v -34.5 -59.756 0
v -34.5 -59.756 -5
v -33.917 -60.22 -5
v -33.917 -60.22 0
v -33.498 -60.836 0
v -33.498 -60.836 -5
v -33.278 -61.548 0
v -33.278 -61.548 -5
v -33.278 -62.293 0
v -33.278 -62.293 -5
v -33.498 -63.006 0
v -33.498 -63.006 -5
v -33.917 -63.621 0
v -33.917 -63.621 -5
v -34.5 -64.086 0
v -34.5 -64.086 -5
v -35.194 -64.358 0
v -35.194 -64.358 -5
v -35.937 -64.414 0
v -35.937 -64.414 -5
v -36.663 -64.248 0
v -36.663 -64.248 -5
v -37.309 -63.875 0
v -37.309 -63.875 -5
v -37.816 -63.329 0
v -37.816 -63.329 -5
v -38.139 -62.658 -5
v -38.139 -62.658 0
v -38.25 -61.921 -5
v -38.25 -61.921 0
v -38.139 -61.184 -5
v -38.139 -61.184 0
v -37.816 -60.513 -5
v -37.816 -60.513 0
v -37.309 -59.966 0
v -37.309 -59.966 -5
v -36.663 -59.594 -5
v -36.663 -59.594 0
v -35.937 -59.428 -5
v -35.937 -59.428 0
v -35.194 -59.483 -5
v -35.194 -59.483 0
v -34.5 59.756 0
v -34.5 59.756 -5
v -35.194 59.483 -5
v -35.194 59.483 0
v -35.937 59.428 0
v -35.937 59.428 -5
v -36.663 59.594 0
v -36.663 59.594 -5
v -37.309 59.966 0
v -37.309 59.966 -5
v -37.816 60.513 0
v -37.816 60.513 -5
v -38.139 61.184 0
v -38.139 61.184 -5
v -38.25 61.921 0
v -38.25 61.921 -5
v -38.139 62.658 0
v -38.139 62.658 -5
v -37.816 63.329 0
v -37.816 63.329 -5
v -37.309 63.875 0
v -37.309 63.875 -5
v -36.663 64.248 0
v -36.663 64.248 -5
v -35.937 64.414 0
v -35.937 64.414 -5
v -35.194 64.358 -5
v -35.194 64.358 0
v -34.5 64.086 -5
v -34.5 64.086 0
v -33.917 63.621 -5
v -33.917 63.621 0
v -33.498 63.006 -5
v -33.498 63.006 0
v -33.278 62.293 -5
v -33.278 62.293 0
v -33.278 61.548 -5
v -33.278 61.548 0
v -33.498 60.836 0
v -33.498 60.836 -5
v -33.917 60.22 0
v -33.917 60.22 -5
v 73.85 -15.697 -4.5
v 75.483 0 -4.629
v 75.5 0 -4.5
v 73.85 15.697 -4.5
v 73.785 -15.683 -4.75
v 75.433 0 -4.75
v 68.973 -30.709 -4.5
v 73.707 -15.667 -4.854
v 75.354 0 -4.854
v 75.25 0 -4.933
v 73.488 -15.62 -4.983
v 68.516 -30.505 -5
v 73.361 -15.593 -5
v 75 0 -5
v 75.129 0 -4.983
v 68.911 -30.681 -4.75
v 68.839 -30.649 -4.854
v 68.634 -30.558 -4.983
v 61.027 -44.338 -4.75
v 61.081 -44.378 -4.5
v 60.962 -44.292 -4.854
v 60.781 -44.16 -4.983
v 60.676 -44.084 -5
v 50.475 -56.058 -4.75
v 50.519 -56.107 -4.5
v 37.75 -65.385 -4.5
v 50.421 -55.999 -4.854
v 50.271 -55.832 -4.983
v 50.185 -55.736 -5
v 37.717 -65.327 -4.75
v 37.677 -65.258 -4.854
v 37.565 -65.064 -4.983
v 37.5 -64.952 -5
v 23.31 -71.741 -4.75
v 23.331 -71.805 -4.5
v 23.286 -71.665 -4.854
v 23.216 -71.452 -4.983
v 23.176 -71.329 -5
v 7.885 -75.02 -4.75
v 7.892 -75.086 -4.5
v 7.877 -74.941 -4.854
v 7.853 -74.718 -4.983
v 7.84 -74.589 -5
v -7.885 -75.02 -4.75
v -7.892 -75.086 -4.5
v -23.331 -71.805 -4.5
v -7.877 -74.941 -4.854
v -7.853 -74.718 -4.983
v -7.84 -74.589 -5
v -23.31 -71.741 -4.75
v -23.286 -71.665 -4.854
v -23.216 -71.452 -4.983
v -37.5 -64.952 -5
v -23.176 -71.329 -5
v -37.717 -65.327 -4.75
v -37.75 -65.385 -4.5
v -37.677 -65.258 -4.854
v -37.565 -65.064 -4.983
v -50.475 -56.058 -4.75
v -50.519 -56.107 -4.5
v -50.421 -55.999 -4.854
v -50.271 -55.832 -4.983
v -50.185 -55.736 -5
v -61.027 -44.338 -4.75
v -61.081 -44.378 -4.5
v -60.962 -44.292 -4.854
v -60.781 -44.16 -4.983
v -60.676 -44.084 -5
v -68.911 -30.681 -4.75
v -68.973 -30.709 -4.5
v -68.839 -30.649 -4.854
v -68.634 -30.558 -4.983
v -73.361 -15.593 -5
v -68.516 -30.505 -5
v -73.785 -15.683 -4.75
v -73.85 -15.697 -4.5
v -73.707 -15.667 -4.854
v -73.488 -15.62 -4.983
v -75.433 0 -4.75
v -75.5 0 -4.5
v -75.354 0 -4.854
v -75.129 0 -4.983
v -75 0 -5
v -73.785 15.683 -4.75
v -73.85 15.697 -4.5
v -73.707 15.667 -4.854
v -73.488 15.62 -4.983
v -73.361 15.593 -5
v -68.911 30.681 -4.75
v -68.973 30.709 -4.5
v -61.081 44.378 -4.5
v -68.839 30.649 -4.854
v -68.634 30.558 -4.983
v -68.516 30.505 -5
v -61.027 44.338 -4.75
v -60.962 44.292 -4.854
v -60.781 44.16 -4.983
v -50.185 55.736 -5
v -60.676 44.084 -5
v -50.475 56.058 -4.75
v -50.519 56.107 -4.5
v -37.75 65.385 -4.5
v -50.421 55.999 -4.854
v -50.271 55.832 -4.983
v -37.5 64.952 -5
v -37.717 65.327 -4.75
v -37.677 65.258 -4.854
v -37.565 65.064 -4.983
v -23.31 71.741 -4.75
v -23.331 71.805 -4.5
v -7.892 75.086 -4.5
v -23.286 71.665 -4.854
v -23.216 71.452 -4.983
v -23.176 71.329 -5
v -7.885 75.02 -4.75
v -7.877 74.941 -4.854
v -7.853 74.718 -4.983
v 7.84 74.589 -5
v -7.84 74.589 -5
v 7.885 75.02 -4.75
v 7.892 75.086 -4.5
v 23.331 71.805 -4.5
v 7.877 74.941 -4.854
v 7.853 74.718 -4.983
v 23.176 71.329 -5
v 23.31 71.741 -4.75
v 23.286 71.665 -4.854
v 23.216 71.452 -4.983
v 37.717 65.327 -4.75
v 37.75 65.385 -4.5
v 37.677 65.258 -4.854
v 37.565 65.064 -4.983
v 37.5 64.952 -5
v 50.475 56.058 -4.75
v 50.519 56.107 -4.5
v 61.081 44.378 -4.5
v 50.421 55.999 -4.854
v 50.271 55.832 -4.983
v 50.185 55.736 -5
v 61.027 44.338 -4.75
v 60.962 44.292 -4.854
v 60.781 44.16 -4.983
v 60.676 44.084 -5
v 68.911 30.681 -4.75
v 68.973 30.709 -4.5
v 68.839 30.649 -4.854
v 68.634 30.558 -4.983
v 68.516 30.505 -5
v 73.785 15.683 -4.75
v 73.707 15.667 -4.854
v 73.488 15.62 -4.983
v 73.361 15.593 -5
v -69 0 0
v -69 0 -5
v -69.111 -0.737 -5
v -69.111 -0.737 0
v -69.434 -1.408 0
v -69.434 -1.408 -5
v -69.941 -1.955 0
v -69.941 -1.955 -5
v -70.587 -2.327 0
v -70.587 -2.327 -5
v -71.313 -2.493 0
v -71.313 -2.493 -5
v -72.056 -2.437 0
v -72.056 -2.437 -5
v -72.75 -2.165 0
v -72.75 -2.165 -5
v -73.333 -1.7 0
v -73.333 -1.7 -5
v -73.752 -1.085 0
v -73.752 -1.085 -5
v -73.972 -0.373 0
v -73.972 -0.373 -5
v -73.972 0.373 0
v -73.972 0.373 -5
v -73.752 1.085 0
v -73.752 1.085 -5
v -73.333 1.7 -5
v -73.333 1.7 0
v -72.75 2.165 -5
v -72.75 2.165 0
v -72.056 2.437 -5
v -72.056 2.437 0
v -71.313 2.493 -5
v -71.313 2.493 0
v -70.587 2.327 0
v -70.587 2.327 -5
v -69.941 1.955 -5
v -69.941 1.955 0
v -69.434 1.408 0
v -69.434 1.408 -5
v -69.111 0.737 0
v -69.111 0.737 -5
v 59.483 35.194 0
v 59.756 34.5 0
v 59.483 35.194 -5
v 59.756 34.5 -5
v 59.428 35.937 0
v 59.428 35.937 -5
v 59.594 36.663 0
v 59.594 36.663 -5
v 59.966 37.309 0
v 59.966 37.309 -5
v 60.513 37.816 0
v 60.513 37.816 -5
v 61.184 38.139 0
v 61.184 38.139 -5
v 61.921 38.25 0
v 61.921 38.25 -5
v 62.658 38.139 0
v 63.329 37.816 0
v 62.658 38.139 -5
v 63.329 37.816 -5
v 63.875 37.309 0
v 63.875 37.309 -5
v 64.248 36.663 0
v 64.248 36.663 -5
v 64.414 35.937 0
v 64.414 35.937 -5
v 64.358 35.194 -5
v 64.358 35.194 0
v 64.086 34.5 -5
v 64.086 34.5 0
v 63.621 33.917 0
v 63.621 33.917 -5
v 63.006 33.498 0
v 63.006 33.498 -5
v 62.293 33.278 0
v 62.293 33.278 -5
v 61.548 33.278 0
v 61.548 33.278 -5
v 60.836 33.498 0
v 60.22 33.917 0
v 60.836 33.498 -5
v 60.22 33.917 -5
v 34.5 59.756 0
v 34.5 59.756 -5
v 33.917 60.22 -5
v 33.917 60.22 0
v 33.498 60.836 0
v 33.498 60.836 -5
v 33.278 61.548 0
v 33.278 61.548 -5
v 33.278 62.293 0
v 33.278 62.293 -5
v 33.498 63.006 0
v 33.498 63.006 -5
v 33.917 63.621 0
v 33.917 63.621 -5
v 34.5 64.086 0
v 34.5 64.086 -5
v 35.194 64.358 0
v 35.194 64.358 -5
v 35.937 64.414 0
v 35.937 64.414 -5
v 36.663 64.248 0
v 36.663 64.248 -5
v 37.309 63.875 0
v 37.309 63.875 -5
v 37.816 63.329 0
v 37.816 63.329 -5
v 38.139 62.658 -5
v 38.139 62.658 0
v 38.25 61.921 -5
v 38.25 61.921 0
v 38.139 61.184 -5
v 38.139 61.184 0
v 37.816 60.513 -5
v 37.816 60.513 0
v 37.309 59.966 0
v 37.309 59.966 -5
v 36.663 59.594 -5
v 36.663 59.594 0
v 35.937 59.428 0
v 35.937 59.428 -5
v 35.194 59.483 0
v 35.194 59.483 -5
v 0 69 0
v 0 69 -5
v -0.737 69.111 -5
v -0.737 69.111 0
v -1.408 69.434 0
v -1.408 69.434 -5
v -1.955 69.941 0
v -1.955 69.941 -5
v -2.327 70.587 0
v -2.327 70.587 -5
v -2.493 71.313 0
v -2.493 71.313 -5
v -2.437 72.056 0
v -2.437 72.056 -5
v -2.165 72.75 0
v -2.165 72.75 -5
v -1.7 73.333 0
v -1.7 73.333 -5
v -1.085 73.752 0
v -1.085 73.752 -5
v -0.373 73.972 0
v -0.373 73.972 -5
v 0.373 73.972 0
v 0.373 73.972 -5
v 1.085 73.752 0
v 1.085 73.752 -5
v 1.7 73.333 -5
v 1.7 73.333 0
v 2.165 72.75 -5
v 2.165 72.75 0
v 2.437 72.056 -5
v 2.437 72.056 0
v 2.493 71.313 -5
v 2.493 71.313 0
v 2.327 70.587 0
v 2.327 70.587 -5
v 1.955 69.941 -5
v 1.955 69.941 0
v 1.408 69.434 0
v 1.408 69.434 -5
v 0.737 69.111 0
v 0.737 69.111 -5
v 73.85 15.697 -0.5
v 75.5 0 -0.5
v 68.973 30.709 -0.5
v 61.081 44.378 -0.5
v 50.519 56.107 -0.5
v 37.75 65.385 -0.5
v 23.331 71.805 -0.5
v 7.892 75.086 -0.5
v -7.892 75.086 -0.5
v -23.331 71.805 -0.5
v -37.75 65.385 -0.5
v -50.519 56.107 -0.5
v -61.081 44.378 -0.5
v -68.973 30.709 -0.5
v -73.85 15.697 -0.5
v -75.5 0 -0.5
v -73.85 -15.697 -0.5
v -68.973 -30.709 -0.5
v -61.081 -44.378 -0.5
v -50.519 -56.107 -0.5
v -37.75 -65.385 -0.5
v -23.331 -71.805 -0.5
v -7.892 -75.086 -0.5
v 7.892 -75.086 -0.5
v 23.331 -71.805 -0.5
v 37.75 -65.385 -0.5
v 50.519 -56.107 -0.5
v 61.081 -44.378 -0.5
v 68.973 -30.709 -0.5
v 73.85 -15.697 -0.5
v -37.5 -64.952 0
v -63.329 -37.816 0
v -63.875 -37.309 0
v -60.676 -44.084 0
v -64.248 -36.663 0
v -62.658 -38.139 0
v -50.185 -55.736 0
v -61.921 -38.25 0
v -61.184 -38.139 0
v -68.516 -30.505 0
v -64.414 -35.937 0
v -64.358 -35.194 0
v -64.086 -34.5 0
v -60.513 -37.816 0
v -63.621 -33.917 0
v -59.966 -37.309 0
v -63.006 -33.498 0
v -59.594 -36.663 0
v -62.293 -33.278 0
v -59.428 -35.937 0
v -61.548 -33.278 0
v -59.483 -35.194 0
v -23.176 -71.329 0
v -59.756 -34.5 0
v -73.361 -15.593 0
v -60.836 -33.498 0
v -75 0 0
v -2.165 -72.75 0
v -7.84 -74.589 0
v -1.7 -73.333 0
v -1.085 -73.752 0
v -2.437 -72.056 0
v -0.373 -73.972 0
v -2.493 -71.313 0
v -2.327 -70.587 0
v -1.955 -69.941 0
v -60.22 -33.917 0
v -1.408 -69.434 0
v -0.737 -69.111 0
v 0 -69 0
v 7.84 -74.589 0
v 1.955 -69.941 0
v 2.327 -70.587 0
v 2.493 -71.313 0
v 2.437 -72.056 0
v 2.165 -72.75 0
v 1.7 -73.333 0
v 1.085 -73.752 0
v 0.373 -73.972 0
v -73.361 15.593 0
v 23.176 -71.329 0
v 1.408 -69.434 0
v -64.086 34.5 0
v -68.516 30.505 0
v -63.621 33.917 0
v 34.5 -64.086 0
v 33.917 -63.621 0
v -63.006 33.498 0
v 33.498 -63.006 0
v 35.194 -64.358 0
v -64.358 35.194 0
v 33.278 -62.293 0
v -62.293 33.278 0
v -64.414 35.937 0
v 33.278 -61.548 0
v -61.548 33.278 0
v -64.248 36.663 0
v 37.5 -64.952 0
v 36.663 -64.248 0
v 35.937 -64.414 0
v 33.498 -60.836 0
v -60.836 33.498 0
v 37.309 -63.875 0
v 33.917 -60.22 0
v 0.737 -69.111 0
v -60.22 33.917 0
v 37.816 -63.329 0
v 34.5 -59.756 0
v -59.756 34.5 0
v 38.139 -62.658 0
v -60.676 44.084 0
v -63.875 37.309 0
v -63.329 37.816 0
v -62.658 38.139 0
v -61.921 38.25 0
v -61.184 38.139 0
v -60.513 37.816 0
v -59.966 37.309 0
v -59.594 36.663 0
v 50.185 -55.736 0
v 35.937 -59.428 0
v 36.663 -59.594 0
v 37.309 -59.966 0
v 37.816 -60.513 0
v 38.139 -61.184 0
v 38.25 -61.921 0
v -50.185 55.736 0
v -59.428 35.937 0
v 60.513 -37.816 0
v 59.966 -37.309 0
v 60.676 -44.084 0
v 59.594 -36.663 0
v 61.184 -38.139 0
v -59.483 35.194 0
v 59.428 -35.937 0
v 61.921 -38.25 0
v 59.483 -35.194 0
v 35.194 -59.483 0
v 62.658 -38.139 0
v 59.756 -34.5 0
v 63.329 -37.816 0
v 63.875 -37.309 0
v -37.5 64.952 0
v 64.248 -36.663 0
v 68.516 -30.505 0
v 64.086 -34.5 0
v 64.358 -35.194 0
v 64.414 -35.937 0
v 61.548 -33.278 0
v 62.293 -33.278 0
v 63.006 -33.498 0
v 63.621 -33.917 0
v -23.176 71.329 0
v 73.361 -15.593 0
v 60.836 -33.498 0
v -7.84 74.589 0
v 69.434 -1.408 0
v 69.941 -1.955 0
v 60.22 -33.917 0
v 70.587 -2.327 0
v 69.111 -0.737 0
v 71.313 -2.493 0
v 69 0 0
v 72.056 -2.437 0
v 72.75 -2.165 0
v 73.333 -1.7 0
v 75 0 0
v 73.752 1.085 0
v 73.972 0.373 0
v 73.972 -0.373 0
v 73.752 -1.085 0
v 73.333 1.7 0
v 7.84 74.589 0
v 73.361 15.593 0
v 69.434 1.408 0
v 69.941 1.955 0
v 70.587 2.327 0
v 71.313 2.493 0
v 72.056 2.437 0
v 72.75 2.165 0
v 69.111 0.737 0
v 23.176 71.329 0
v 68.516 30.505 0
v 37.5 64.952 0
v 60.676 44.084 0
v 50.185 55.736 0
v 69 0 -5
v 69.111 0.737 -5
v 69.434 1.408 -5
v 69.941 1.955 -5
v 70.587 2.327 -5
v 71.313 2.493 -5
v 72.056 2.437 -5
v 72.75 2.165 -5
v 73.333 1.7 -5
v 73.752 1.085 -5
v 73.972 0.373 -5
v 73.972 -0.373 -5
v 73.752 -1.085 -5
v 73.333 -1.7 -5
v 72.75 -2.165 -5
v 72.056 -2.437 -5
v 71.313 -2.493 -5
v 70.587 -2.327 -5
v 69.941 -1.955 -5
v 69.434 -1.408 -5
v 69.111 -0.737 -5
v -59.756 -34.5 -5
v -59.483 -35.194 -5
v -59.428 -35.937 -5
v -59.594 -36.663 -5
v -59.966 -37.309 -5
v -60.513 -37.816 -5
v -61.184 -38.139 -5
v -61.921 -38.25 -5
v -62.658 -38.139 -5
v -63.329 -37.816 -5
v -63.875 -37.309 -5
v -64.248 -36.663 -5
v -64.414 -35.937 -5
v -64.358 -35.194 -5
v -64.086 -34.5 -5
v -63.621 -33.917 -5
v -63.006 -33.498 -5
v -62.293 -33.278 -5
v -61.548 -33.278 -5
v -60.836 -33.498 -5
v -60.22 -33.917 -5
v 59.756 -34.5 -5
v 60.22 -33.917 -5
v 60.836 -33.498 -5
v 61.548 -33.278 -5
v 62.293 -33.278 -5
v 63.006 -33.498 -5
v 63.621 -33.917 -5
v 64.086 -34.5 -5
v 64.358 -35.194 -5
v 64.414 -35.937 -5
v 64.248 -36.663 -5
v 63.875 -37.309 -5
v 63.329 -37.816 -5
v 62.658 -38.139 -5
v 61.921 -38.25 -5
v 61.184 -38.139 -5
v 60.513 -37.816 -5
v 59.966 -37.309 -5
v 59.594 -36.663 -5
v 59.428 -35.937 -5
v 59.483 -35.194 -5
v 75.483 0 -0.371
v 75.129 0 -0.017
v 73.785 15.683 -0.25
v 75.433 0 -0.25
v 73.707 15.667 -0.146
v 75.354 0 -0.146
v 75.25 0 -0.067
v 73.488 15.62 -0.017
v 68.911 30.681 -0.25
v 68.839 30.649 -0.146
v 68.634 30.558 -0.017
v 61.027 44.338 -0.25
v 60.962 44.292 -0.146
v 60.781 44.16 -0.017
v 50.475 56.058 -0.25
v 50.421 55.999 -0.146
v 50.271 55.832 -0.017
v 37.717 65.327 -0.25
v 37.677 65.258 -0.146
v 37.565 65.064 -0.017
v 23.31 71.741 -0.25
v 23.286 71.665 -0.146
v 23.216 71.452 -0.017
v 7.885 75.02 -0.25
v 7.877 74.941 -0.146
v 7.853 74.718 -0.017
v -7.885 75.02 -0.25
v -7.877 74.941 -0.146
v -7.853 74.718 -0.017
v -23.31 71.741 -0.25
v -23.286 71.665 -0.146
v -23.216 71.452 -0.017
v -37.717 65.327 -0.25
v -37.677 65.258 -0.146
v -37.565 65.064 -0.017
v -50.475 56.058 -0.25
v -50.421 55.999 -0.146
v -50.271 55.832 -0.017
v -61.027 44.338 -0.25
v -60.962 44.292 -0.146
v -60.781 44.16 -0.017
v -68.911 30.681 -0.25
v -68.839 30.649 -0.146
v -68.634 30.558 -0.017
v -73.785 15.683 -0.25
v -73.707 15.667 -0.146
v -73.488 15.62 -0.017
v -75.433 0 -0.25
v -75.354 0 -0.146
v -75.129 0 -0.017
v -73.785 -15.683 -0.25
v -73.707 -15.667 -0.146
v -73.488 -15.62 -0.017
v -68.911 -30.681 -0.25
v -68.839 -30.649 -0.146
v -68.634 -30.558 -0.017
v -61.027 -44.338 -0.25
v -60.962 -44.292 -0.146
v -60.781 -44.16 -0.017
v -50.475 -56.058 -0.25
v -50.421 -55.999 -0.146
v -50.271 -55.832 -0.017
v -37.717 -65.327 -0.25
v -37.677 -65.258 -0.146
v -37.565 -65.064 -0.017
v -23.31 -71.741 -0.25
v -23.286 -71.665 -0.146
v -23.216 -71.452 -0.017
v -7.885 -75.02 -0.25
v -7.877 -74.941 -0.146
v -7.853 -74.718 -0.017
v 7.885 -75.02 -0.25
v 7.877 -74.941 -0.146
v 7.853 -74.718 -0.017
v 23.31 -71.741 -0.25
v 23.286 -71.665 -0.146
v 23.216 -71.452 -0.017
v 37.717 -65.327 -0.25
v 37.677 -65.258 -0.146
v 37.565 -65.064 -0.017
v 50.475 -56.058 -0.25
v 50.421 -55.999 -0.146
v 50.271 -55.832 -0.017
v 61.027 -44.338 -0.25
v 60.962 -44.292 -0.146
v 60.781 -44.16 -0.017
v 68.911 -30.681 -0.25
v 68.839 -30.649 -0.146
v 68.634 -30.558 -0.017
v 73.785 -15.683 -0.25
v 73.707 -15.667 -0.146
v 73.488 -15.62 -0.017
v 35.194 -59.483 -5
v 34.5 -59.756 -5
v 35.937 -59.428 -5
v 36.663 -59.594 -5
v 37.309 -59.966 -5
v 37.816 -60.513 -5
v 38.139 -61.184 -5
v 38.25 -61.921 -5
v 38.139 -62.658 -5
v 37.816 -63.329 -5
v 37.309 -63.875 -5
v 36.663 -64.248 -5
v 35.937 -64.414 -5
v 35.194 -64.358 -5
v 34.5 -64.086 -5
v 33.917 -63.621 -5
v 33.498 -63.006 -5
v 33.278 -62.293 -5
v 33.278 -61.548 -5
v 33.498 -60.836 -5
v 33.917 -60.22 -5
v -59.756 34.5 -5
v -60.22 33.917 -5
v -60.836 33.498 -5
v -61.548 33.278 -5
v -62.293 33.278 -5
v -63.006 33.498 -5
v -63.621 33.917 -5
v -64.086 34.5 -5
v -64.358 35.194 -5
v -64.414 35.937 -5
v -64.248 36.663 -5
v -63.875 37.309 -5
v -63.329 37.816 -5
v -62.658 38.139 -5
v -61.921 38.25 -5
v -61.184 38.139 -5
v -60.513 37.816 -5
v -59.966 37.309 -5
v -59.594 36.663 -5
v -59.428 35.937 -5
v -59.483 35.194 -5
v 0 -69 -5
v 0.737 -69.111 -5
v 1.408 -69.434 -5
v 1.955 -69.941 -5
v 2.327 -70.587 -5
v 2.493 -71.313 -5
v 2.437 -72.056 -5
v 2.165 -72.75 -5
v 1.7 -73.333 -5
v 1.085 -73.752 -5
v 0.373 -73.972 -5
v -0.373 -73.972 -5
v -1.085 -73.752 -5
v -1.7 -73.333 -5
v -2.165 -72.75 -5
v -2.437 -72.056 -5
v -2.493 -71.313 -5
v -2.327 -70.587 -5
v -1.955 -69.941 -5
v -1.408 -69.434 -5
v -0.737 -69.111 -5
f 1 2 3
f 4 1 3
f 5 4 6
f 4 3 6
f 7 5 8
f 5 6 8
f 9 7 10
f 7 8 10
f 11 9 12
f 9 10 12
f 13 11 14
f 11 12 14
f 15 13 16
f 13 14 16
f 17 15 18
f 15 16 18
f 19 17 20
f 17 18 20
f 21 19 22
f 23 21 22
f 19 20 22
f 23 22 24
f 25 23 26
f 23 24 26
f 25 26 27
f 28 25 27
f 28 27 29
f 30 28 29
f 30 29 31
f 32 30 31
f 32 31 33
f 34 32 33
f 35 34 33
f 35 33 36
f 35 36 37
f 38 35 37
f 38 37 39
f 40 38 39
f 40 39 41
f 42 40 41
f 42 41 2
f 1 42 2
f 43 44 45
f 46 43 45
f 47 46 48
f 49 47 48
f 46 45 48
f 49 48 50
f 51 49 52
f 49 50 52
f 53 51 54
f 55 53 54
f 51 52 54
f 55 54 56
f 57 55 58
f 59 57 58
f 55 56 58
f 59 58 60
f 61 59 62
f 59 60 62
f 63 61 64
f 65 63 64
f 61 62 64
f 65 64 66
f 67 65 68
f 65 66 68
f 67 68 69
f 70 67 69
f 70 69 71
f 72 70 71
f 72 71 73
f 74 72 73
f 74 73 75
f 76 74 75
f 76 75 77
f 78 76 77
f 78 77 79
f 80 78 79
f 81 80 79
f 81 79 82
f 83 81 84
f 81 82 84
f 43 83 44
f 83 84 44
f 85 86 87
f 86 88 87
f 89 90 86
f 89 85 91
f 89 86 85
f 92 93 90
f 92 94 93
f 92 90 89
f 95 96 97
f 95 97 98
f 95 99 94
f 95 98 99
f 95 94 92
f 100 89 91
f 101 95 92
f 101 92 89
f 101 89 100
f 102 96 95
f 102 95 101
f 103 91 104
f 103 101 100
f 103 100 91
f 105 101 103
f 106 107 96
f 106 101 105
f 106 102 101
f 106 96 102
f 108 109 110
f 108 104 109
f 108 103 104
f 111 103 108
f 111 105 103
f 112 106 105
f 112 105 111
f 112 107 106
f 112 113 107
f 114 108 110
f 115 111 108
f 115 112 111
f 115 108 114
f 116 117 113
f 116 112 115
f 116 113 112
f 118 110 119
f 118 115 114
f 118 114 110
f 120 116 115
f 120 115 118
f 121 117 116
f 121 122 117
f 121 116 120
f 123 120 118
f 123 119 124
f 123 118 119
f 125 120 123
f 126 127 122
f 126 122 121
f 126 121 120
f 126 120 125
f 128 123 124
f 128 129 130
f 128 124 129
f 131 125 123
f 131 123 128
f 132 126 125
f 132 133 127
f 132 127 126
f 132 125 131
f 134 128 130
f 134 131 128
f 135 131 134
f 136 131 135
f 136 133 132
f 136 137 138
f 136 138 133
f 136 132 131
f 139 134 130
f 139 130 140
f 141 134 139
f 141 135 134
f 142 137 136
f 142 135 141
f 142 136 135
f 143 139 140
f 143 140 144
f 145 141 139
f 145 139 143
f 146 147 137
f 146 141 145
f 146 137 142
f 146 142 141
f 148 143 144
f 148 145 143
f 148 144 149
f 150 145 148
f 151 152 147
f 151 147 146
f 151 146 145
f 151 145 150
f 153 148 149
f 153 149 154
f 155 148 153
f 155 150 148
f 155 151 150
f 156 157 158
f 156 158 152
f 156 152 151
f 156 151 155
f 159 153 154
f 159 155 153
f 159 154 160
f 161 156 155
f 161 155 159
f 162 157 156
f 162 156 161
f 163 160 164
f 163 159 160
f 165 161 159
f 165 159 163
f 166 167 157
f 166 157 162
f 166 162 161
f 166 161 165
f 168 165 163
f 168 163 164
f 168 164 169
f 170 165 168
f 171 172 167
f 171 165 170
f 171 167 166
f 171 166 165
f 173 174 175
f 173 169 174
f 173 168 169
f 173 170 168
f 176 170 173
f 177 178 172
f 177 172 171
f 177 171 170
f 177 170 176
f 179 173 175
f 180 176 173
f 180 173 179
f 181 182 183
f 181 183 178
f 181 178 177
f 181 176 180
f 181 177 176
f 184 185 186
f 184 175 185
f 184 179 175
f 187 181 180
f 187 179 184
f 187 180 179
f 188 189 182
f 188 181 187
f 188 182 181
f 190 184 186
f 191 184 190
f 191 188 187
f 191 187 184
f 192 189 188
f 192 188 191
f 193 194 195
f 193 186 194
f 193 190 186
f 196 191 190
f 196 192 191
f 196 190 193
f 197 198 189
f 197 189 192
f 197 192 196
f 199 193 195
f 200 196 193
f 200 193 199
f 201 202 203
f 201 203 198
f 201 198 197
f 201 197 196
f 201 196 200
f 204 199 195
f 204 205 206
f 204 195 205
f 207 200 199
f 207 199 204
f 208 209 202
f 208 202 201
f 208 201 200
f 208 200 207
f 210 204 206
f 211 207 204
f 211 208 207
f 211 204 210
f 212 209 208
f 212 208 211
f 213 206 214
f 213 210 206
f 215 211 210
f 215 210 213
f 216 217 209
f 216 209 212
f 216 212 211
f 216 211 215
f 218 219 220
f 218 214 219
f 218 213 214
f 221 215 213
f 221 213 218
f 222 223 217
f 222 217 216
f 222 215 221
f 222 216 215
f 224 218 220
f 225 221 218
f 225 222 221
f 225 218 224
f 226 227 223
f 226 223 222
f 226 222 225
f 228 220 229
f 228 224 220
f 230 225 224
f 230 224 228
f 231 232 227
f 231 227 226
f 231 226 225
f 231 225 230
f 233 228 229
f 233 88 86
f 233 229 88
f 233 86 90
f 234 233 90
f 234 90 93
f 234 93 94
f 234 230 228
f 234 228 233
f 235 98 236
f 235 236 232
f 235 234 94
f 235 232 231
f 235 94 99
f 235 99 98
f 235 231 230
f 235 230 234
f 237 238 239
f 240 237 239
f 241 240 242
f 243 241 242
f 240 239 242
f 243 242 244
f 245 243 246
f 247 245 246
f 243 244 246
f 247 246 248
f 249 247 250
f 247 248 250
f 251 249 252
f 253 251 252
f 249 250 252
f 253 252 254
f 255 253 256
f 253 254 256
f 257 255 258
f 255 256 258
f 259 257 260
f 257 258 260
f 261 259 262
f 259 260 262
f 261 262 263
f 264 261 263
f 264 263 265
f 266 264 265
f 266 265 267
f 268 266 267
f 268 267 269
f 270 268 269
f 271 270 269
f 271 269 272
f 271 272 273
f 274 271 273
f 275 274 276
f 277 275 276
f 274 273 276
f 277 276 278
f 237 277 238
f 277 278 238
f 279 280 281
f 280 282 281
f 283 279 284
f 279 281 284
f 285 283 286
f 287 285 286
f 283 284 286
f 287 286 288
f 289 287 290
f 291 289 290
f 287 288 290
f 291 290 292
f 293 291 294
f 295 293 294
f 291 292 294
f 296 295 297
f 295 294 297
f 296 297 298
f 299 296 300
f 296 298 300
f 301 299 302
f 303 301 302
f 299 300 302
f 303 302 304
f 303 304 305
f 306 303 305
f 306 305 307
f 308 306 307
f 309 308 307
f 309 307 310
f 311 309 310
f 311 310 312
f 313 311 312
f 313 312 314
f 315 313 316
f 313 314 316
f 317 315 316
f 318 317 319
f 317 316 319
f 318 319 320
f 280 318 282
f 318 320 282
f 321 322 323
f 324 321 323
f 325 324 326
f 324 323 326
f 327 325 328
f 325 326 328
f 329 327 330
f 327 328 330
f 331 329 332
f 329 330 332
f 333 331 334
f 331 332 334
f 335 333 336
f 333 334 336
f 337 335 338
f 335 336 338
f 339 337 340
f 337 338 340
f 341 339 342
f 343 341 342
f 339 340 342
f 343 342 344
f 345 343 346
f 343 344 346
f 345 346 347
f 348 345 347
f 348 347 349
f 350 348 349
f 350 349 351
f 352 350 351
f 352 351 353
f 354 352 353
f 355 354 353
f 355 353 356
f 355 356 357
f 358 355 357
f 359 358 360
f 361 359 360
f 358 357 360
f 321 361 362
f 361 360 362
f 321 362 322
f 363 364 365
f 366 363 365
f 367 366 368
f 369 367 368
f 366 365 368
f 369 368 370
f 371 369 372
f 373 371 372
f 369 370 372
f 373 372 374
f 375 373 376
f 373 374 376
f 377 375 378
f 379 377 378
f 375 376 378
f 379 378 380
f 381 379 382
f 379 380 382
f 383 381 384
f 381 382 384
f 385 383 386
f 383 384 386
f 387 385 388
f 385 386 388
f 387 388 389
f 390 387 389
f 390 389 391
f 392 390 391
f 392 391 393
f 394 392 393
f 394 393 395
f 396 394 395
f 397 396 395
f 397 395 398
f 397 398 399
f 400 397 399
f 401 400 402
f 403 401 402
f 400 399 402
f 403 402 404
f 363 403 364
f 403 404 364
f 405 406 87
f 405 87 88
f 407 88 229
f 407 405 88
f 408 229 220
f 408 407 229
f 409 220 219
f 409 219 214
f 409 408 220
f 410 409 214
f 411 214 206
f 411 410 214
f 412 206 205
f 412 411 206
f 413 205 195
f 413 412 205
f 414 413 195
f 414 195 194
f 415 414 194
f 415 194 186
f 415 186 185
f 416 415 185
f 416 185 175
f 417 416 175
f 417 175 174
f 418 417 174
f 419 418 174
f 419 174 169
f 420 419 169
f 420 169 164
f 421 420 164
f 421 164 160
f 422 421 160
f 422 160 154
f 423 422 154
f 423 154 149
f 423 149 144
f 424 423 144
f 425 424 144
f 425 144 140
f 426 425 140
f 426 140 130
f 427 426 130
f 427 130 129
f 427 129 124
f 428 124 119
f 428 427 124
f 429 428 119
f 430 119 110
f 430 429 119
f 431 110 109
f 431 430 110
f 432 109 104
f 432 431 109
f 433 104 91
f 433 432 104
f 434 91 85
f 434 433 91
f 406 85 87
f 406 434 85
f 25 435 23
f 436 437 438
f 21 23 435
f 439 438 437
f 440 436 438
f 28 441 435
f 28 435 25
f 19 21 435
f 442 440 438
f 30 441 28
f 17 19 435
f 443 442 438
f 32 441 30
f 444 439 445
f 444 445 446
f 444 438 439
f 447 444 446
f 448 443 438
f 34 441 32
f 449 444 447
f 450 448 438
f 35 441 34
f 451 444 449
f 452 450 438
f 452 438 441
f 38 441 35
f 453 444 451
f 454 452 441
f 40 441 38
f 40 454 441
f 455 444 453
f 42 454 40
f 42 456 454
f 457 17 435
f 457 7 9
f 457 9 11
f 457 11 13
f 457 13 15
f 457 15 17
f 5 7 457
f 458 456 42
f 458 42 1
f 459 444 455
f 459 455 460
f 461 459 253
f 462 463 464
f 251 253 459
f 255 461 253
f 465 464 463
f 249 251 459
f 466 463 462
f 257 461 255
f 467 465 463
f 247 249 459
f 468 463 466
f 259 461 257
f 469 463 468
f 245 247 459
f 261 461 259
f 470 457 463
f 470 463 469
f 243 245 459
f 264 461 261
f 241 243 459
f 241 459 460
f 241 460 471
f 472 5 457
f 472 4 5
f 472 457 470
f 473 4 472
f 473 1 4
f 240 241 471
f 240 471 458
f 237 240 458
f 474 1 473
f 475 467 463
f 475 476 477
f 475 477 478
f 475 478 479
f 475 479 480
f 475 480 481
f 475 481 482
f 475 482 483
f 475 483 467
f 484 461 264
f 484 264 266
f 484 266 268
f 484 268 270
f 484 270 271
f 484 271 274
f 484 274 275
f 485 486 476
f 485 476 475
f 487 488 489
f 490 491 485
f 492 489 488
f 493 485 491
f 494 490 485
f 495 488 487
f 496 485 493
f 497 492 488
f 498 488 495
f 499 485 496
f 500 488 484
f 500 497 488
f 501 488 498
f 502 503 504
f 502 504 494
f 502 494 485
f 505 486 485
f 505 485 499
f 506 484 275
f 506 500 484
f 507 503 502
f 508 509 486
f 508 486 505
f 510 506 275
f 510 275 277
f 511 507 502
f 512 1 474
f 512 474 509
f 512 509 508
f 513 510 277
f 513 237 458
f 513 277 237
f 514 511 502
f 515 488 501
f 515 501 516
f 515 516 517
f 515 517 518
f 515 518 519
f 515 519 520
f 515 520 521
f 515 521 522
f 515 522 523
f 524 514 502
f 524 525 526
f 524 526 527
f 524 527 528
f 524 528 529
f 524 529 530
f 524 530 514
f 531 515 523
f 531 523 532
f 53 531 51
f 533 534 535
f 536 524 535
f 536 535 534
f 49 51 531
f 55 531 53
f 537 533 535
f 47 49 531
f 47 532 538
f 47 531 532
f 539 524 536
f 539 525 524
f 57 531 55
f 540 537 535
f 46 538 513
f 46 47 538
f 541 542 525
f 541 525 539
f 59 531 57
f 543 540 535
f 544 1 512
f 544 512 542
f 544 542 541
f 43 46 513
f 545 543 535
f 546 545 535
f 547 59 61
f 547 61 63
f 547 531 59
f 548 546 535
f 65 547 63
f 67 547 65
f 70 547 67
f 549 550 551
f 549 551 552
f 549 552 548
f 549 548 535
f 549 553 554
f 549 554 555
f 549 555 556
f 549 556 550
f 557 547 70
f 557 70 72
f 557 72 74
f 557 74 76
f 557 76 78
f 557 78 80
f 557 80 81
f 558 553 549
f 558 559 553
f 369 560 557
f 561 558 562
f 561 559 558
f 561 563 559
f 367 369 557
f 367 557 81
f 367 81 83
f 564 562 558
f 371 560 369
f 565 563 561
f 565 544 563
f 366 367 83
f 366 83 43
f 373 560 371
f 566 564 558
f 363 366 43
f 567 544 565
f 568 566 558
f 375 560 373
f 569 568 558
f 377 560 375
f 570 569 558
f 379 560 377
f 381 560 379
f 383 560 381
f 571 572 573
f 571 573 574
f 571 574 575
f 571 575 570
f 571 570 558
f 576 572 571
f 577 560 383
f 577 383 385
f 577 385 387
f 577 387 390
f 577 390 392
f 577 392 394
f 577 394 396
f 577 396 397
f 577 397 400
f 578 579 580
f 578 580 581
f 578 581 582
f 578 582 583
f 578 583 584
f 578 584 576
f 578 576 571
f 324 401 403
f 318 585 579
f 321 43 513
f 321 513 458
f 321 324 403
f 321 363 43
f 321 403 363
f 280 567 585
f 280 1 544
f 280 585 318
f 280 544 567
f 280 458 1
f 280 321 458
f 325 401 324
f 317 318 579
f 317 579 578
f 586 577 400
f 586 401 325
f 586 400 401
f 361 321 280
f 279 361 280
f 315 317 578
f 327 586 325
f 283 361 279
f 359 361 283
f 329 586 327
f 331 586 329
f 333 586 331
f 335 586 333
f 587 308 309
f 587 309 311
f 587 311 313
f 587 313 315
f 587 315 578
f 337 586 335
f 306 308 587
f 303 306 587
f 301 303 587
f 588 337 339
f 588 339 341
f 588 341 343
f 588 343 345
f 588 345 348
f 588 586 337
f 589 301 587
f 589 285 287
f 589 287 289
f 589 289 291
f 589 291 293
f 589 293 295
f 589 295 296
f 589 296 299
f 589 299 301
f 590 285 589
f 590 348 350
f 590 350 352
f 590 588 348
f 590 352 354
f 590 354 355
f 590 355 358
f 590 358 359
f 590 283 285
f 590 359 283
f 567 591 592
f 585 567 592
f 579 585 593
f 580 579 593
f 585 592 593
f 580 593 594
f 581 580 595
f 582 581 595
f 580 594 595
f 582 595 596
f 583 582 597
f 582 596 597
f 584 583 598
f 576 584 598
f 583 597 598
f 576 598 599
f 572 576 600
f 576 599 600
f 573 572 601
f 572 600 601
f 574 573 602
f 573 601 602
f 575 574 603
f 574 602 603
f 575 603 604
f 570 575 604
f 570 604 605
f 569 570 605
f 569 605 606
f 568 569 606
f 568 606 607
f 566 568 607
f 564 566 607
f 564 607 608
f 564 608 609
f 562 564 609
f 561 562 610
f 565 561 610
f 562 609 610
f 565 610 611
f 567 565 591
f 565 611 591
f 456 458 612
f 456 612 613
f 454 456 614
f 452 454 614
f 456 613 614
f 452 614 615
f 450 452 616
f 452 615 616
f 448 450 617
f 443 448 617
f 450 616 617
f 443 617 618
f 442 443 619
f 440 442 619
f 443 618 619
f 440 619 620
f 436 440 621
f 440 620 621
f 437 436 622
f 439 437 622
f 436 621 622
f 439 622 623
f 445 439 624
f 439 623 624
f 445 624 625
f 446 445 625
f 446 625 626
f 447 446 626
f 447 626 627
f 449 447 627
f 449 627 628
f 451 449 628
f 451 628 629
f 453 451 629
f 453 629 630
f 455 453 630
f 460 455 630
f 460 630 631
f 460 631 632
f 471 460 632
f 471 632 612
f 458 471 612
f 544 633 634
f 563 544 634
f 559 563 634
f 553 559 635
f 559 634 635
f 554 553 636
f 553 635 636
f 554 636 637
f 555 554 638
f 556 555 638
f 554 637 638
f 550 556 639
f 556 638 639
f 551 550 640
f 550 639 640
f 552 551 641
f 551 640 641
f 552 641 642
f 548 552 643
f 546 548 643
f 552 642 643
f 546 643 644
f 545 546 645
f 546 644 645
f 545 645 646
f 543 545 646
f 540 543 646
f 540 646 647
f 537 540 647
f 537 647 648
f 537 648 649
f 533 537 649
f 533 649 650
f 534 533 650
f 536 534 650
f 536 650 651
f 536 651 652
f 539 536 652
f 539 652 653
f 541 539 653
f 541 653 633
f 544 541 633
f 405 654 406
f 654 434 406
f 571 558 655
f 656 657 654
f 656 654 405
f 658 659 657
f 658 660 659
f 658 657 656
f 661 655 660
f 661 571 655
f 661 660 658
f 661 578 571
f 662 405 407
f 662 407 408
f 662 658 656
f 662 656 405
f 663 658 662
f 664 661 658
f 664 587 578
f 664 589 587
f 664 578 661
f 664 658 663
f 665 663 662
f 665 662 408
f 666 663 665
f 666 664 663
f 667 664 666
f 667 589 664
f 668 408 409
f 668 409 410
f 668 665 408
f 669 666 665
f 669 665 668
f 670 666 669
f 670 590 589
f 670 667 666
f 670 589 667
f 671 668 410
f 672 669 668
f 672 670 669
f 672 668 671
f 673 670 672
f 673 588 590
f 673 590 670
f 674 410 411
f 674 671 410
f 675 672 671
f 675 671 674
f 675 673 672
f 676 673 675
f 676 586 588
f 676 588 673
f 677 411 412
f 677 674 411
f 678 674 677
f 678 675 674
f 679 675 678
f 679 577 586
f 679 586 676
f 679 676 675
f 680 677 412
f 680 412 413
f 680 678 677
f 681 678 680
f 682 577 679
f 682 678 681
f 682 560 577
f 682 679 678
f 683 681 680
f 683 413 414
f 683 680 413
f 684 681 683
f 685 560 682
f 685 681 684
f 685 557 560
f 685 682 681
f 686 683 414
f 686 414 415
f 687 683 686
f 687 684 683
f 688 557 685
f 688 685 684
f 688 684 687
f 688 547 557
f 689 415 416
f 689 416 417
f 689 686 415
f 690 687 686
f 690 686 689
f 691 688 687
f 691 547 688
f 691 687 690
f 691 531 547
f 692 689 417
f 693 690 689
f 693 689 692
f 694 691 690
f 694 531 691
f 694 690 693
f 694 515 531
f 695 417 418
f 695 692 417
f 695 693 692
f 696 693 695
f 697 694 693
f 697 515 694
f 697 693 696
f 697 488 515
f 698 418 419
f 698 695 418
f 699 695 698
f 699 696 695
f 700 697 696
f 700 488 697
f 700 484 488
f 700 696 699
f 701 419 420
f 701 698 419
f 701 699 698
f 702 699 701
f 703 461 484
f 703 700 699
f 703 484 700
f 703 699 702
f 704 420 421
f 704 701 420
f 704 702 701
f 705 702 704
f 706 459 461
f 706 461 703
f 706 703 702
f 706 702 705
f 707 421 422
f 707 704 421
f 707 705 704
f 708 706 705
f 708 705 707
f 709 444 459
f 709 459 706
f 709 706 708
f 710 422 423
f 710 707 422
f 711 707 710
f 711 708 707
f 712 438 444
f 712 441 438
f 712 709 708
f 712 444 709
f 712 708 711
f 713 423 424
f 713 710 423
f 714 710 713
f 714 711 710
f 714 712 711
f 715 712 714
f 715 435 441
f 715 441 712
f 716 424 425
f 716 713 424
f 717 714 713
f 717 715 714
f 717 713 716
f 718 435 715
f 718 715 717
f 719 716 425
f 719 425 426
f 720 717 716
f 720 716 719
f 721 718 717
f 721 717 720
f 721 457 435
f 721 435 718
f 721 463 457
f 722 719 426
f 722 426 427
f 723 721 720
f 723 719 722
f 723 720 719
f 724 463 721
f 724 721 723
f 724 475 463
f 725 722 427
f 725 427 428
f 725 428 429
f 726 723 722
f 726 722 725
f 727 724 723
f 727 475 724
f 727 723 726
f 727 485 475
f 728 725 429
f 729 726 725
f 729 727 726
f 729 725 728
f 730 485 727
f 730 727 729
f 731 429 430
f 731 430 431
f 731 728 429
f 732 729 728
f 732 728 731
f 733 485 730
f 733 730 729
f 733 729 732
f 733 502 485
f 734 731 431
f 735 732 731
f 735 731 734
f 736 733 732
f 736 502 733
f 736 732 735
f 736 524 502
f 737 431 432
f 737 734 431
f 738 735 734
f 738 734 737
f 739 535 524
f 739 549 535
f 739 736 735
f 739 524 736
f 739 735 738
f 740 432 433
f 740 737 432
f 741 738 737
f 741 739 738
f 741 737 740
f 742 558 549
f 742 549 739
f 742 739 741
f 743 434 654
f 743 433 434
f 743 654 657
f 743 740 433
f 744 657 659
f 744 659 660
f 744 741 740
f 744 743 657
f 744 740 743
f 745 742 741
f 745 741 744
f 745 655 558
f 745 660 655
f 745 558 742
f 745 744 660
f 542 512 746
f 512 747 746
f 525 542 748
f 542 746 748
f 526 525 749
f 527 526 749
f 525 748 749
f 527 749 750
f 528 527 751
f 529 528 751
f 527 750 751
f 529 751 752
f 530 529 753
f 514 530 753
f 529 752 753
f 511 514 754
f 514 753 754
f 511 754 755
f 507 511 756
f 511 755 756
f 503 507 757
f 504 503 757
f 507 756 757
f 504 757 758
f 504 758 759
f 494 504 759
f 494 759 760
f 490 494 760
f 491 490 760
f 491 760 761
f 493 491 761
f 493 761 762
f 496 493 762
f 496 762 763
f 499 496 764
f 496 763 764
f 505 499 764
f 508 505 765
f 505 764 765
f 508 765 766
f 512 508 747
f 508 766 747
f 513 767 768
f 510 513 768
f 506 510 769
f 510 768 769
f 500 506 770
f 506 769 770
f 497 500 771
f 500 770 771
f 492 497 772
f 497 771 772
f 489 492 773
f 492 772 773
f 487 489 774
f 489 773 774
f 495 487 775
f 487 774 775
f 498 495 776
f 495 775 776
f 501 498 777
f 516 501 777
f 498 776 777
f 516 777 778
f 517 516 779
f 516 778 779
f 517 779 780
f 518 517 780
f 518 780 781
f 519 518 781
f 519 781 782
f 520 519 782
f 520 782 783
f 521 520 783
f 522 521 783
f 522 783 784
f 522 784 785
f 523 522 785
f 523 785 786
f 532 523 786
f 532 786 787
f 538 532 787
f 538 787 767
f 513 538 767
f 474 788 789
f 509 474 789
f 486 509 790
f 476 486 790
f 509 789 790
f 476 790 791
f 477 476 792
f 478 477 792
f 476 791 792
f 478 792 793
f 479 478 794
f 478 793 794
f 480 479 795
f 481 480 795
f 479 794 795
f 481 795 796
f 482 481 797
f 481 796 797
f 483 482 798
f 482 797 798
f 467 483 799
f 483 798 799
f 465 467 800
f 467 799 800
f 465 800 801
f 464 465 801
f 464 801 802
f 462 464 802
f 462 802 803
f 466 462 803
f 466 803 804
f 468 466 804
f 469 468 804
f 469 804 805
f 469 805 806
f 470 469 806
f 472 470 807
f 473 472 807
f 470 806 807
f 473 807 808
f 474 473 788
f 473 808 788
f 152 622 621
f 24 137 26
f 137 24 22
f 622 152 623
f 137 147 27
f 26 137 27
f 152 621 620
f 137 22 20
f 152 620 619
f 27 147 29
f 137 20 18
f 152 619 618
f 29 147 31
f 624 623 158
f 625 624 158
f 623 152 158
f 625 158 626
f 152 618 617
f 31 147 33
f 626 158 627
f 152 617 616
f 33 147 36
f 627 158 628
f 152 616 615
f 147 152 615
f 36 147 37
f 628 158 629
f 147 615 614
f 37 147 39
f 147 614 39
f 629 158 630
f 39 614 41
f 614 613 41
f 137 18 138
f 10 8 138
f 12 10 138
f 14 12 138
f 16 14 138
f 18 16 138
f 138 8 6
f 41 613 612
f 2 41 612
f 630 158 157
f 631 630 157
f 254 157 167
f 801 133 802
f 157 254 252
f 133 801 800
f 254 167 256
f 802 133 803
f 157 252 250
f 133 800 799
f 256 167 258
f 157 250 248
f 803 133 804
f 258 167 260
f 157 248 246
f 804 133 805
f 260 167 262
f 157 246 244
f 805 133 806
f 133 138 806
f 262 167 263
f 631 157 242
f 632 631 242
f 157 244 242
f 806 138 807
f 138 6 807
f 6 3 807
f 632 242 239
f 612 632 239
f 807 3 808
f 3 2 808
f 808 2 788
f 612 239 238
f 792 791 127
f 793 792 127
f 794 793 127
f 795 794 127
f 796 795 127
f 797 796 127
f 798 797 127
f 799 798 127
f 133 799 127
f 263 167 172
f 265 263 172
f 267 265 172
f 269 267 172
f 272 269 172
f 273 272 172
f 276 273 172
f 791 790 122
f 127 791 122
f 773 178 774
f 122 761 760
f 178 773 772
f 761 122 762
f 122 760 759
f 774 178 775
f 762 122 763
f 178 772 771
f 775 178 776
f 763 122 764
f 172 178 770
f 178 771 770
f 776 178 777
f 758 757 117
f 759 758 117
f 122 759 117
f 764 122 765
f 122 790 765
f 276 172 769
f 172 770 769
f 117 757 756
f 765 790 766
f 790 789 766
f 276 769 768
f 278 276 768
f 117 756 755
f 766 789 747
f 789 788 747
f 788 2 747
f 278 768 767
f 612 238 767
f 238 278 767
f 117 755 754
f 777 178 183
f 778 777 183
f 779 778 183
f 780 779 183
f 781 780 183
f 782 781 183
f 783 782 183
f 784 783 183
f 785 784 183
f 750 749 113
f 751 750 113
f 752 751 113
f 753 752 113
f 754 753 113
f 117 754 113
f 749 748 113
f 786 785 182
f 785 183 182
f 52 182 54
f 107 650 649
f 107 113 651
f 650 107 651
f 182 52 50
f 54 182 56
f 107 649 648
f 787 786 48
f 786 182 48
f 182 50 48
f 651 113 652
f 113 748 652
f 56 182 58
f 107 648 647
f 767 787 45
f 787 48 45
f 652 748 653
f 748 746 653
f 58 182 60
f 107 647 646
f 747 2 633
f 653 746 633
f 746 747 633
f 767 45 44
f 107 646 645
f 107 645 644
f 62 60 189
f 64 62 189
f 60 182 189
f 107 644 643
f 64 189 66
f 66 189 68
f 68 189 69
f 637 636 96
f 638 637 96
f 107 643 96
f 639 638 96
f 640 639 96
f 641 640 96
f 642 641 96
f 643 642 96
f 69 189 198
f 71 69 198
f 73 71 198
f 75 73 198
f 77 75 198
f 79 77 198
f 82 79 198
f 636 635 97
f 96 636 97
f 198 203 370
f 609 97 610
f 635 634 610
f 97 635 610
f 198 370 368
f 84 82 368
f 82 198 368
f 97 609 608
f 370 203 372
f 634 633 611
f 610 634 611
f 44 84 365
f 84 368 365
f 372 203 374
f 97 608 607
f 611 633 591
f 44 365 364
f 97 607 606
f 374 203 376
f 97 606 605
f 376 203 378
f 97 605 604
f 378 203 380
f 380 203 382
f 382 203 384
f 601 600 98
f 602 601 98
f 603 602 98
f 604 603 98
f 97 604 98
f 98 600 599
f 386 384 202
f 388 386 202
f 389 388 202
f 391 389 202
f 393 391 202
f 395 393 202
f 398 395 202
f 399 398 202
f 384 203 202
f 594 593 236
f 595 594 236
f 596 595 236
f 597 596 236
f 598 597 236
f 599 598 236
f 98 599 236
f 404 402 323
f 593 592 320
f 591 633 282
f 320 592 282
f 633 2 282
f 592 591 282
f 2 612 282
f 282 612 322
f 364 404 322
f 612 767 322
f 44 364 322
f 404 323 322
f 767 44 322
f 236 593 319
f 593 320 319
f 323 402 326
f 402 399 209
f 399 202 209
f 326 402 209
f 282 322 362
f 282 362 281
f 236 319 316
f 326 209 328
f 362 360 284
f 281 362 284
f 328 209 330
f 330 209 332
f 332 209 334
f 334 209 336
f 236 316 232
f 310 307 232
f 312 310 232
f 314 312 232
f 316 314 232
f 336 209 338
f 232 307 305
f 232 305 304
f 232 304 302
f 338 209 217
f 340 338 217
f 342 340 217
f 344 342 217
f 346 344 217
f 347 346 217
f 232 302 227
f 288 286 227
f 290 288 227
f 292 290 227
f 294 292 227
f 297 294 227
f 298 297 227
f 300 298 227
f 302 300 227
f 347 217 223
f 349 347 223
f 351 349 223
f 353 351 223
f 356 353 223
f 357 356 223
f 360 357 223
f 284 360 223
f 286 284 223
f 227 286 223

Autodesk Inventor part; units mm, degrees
ref_plane "YZ Plane" through (0, 0, 0) normal (1, 0, 0) x (0, 1, 0)
ref_plane "XZ Plane" through (0, 0, 0) normal (0, 1, 0) x (-1, 0, 0)
ref_plane "XY Plane" through (0, 0, 0) normal (0, 0, 1) x (1, 0, 0)
sketch "Sketch1" plane through (0, 0, 0) normal (0, 0, 1) x (1, 0, 0)
  circle A0 centre (0, 0) radius 75.5
  dimension "d0" = 151
extrude "Extrusion1" add sketch "Sketch1" against normal blind 5
sketch "Sketch2" plane through (0, 0, 0) normal (0, 0, 1) x (1, 0, 0)
  circle A0 centre (0, 0) radius 71.5 construction
  point P0 (0, 71.5)
  dimension "d3" = 143
hole "Hole1" at (0, 71.5, 0) direction (0, 0, -1) diameter 5 depth 5
pattern_circular "Circular Pattern1" count 12 over 360 about axis through (0, 0, 0) along (0, 0, -1) of "Hole1"
fillet "Fillet1" radius 0.5 2 edges at (-75.5, 0, 0) (-75.5, 0, -5)
properties part number "101 part 1" material "Silver"
